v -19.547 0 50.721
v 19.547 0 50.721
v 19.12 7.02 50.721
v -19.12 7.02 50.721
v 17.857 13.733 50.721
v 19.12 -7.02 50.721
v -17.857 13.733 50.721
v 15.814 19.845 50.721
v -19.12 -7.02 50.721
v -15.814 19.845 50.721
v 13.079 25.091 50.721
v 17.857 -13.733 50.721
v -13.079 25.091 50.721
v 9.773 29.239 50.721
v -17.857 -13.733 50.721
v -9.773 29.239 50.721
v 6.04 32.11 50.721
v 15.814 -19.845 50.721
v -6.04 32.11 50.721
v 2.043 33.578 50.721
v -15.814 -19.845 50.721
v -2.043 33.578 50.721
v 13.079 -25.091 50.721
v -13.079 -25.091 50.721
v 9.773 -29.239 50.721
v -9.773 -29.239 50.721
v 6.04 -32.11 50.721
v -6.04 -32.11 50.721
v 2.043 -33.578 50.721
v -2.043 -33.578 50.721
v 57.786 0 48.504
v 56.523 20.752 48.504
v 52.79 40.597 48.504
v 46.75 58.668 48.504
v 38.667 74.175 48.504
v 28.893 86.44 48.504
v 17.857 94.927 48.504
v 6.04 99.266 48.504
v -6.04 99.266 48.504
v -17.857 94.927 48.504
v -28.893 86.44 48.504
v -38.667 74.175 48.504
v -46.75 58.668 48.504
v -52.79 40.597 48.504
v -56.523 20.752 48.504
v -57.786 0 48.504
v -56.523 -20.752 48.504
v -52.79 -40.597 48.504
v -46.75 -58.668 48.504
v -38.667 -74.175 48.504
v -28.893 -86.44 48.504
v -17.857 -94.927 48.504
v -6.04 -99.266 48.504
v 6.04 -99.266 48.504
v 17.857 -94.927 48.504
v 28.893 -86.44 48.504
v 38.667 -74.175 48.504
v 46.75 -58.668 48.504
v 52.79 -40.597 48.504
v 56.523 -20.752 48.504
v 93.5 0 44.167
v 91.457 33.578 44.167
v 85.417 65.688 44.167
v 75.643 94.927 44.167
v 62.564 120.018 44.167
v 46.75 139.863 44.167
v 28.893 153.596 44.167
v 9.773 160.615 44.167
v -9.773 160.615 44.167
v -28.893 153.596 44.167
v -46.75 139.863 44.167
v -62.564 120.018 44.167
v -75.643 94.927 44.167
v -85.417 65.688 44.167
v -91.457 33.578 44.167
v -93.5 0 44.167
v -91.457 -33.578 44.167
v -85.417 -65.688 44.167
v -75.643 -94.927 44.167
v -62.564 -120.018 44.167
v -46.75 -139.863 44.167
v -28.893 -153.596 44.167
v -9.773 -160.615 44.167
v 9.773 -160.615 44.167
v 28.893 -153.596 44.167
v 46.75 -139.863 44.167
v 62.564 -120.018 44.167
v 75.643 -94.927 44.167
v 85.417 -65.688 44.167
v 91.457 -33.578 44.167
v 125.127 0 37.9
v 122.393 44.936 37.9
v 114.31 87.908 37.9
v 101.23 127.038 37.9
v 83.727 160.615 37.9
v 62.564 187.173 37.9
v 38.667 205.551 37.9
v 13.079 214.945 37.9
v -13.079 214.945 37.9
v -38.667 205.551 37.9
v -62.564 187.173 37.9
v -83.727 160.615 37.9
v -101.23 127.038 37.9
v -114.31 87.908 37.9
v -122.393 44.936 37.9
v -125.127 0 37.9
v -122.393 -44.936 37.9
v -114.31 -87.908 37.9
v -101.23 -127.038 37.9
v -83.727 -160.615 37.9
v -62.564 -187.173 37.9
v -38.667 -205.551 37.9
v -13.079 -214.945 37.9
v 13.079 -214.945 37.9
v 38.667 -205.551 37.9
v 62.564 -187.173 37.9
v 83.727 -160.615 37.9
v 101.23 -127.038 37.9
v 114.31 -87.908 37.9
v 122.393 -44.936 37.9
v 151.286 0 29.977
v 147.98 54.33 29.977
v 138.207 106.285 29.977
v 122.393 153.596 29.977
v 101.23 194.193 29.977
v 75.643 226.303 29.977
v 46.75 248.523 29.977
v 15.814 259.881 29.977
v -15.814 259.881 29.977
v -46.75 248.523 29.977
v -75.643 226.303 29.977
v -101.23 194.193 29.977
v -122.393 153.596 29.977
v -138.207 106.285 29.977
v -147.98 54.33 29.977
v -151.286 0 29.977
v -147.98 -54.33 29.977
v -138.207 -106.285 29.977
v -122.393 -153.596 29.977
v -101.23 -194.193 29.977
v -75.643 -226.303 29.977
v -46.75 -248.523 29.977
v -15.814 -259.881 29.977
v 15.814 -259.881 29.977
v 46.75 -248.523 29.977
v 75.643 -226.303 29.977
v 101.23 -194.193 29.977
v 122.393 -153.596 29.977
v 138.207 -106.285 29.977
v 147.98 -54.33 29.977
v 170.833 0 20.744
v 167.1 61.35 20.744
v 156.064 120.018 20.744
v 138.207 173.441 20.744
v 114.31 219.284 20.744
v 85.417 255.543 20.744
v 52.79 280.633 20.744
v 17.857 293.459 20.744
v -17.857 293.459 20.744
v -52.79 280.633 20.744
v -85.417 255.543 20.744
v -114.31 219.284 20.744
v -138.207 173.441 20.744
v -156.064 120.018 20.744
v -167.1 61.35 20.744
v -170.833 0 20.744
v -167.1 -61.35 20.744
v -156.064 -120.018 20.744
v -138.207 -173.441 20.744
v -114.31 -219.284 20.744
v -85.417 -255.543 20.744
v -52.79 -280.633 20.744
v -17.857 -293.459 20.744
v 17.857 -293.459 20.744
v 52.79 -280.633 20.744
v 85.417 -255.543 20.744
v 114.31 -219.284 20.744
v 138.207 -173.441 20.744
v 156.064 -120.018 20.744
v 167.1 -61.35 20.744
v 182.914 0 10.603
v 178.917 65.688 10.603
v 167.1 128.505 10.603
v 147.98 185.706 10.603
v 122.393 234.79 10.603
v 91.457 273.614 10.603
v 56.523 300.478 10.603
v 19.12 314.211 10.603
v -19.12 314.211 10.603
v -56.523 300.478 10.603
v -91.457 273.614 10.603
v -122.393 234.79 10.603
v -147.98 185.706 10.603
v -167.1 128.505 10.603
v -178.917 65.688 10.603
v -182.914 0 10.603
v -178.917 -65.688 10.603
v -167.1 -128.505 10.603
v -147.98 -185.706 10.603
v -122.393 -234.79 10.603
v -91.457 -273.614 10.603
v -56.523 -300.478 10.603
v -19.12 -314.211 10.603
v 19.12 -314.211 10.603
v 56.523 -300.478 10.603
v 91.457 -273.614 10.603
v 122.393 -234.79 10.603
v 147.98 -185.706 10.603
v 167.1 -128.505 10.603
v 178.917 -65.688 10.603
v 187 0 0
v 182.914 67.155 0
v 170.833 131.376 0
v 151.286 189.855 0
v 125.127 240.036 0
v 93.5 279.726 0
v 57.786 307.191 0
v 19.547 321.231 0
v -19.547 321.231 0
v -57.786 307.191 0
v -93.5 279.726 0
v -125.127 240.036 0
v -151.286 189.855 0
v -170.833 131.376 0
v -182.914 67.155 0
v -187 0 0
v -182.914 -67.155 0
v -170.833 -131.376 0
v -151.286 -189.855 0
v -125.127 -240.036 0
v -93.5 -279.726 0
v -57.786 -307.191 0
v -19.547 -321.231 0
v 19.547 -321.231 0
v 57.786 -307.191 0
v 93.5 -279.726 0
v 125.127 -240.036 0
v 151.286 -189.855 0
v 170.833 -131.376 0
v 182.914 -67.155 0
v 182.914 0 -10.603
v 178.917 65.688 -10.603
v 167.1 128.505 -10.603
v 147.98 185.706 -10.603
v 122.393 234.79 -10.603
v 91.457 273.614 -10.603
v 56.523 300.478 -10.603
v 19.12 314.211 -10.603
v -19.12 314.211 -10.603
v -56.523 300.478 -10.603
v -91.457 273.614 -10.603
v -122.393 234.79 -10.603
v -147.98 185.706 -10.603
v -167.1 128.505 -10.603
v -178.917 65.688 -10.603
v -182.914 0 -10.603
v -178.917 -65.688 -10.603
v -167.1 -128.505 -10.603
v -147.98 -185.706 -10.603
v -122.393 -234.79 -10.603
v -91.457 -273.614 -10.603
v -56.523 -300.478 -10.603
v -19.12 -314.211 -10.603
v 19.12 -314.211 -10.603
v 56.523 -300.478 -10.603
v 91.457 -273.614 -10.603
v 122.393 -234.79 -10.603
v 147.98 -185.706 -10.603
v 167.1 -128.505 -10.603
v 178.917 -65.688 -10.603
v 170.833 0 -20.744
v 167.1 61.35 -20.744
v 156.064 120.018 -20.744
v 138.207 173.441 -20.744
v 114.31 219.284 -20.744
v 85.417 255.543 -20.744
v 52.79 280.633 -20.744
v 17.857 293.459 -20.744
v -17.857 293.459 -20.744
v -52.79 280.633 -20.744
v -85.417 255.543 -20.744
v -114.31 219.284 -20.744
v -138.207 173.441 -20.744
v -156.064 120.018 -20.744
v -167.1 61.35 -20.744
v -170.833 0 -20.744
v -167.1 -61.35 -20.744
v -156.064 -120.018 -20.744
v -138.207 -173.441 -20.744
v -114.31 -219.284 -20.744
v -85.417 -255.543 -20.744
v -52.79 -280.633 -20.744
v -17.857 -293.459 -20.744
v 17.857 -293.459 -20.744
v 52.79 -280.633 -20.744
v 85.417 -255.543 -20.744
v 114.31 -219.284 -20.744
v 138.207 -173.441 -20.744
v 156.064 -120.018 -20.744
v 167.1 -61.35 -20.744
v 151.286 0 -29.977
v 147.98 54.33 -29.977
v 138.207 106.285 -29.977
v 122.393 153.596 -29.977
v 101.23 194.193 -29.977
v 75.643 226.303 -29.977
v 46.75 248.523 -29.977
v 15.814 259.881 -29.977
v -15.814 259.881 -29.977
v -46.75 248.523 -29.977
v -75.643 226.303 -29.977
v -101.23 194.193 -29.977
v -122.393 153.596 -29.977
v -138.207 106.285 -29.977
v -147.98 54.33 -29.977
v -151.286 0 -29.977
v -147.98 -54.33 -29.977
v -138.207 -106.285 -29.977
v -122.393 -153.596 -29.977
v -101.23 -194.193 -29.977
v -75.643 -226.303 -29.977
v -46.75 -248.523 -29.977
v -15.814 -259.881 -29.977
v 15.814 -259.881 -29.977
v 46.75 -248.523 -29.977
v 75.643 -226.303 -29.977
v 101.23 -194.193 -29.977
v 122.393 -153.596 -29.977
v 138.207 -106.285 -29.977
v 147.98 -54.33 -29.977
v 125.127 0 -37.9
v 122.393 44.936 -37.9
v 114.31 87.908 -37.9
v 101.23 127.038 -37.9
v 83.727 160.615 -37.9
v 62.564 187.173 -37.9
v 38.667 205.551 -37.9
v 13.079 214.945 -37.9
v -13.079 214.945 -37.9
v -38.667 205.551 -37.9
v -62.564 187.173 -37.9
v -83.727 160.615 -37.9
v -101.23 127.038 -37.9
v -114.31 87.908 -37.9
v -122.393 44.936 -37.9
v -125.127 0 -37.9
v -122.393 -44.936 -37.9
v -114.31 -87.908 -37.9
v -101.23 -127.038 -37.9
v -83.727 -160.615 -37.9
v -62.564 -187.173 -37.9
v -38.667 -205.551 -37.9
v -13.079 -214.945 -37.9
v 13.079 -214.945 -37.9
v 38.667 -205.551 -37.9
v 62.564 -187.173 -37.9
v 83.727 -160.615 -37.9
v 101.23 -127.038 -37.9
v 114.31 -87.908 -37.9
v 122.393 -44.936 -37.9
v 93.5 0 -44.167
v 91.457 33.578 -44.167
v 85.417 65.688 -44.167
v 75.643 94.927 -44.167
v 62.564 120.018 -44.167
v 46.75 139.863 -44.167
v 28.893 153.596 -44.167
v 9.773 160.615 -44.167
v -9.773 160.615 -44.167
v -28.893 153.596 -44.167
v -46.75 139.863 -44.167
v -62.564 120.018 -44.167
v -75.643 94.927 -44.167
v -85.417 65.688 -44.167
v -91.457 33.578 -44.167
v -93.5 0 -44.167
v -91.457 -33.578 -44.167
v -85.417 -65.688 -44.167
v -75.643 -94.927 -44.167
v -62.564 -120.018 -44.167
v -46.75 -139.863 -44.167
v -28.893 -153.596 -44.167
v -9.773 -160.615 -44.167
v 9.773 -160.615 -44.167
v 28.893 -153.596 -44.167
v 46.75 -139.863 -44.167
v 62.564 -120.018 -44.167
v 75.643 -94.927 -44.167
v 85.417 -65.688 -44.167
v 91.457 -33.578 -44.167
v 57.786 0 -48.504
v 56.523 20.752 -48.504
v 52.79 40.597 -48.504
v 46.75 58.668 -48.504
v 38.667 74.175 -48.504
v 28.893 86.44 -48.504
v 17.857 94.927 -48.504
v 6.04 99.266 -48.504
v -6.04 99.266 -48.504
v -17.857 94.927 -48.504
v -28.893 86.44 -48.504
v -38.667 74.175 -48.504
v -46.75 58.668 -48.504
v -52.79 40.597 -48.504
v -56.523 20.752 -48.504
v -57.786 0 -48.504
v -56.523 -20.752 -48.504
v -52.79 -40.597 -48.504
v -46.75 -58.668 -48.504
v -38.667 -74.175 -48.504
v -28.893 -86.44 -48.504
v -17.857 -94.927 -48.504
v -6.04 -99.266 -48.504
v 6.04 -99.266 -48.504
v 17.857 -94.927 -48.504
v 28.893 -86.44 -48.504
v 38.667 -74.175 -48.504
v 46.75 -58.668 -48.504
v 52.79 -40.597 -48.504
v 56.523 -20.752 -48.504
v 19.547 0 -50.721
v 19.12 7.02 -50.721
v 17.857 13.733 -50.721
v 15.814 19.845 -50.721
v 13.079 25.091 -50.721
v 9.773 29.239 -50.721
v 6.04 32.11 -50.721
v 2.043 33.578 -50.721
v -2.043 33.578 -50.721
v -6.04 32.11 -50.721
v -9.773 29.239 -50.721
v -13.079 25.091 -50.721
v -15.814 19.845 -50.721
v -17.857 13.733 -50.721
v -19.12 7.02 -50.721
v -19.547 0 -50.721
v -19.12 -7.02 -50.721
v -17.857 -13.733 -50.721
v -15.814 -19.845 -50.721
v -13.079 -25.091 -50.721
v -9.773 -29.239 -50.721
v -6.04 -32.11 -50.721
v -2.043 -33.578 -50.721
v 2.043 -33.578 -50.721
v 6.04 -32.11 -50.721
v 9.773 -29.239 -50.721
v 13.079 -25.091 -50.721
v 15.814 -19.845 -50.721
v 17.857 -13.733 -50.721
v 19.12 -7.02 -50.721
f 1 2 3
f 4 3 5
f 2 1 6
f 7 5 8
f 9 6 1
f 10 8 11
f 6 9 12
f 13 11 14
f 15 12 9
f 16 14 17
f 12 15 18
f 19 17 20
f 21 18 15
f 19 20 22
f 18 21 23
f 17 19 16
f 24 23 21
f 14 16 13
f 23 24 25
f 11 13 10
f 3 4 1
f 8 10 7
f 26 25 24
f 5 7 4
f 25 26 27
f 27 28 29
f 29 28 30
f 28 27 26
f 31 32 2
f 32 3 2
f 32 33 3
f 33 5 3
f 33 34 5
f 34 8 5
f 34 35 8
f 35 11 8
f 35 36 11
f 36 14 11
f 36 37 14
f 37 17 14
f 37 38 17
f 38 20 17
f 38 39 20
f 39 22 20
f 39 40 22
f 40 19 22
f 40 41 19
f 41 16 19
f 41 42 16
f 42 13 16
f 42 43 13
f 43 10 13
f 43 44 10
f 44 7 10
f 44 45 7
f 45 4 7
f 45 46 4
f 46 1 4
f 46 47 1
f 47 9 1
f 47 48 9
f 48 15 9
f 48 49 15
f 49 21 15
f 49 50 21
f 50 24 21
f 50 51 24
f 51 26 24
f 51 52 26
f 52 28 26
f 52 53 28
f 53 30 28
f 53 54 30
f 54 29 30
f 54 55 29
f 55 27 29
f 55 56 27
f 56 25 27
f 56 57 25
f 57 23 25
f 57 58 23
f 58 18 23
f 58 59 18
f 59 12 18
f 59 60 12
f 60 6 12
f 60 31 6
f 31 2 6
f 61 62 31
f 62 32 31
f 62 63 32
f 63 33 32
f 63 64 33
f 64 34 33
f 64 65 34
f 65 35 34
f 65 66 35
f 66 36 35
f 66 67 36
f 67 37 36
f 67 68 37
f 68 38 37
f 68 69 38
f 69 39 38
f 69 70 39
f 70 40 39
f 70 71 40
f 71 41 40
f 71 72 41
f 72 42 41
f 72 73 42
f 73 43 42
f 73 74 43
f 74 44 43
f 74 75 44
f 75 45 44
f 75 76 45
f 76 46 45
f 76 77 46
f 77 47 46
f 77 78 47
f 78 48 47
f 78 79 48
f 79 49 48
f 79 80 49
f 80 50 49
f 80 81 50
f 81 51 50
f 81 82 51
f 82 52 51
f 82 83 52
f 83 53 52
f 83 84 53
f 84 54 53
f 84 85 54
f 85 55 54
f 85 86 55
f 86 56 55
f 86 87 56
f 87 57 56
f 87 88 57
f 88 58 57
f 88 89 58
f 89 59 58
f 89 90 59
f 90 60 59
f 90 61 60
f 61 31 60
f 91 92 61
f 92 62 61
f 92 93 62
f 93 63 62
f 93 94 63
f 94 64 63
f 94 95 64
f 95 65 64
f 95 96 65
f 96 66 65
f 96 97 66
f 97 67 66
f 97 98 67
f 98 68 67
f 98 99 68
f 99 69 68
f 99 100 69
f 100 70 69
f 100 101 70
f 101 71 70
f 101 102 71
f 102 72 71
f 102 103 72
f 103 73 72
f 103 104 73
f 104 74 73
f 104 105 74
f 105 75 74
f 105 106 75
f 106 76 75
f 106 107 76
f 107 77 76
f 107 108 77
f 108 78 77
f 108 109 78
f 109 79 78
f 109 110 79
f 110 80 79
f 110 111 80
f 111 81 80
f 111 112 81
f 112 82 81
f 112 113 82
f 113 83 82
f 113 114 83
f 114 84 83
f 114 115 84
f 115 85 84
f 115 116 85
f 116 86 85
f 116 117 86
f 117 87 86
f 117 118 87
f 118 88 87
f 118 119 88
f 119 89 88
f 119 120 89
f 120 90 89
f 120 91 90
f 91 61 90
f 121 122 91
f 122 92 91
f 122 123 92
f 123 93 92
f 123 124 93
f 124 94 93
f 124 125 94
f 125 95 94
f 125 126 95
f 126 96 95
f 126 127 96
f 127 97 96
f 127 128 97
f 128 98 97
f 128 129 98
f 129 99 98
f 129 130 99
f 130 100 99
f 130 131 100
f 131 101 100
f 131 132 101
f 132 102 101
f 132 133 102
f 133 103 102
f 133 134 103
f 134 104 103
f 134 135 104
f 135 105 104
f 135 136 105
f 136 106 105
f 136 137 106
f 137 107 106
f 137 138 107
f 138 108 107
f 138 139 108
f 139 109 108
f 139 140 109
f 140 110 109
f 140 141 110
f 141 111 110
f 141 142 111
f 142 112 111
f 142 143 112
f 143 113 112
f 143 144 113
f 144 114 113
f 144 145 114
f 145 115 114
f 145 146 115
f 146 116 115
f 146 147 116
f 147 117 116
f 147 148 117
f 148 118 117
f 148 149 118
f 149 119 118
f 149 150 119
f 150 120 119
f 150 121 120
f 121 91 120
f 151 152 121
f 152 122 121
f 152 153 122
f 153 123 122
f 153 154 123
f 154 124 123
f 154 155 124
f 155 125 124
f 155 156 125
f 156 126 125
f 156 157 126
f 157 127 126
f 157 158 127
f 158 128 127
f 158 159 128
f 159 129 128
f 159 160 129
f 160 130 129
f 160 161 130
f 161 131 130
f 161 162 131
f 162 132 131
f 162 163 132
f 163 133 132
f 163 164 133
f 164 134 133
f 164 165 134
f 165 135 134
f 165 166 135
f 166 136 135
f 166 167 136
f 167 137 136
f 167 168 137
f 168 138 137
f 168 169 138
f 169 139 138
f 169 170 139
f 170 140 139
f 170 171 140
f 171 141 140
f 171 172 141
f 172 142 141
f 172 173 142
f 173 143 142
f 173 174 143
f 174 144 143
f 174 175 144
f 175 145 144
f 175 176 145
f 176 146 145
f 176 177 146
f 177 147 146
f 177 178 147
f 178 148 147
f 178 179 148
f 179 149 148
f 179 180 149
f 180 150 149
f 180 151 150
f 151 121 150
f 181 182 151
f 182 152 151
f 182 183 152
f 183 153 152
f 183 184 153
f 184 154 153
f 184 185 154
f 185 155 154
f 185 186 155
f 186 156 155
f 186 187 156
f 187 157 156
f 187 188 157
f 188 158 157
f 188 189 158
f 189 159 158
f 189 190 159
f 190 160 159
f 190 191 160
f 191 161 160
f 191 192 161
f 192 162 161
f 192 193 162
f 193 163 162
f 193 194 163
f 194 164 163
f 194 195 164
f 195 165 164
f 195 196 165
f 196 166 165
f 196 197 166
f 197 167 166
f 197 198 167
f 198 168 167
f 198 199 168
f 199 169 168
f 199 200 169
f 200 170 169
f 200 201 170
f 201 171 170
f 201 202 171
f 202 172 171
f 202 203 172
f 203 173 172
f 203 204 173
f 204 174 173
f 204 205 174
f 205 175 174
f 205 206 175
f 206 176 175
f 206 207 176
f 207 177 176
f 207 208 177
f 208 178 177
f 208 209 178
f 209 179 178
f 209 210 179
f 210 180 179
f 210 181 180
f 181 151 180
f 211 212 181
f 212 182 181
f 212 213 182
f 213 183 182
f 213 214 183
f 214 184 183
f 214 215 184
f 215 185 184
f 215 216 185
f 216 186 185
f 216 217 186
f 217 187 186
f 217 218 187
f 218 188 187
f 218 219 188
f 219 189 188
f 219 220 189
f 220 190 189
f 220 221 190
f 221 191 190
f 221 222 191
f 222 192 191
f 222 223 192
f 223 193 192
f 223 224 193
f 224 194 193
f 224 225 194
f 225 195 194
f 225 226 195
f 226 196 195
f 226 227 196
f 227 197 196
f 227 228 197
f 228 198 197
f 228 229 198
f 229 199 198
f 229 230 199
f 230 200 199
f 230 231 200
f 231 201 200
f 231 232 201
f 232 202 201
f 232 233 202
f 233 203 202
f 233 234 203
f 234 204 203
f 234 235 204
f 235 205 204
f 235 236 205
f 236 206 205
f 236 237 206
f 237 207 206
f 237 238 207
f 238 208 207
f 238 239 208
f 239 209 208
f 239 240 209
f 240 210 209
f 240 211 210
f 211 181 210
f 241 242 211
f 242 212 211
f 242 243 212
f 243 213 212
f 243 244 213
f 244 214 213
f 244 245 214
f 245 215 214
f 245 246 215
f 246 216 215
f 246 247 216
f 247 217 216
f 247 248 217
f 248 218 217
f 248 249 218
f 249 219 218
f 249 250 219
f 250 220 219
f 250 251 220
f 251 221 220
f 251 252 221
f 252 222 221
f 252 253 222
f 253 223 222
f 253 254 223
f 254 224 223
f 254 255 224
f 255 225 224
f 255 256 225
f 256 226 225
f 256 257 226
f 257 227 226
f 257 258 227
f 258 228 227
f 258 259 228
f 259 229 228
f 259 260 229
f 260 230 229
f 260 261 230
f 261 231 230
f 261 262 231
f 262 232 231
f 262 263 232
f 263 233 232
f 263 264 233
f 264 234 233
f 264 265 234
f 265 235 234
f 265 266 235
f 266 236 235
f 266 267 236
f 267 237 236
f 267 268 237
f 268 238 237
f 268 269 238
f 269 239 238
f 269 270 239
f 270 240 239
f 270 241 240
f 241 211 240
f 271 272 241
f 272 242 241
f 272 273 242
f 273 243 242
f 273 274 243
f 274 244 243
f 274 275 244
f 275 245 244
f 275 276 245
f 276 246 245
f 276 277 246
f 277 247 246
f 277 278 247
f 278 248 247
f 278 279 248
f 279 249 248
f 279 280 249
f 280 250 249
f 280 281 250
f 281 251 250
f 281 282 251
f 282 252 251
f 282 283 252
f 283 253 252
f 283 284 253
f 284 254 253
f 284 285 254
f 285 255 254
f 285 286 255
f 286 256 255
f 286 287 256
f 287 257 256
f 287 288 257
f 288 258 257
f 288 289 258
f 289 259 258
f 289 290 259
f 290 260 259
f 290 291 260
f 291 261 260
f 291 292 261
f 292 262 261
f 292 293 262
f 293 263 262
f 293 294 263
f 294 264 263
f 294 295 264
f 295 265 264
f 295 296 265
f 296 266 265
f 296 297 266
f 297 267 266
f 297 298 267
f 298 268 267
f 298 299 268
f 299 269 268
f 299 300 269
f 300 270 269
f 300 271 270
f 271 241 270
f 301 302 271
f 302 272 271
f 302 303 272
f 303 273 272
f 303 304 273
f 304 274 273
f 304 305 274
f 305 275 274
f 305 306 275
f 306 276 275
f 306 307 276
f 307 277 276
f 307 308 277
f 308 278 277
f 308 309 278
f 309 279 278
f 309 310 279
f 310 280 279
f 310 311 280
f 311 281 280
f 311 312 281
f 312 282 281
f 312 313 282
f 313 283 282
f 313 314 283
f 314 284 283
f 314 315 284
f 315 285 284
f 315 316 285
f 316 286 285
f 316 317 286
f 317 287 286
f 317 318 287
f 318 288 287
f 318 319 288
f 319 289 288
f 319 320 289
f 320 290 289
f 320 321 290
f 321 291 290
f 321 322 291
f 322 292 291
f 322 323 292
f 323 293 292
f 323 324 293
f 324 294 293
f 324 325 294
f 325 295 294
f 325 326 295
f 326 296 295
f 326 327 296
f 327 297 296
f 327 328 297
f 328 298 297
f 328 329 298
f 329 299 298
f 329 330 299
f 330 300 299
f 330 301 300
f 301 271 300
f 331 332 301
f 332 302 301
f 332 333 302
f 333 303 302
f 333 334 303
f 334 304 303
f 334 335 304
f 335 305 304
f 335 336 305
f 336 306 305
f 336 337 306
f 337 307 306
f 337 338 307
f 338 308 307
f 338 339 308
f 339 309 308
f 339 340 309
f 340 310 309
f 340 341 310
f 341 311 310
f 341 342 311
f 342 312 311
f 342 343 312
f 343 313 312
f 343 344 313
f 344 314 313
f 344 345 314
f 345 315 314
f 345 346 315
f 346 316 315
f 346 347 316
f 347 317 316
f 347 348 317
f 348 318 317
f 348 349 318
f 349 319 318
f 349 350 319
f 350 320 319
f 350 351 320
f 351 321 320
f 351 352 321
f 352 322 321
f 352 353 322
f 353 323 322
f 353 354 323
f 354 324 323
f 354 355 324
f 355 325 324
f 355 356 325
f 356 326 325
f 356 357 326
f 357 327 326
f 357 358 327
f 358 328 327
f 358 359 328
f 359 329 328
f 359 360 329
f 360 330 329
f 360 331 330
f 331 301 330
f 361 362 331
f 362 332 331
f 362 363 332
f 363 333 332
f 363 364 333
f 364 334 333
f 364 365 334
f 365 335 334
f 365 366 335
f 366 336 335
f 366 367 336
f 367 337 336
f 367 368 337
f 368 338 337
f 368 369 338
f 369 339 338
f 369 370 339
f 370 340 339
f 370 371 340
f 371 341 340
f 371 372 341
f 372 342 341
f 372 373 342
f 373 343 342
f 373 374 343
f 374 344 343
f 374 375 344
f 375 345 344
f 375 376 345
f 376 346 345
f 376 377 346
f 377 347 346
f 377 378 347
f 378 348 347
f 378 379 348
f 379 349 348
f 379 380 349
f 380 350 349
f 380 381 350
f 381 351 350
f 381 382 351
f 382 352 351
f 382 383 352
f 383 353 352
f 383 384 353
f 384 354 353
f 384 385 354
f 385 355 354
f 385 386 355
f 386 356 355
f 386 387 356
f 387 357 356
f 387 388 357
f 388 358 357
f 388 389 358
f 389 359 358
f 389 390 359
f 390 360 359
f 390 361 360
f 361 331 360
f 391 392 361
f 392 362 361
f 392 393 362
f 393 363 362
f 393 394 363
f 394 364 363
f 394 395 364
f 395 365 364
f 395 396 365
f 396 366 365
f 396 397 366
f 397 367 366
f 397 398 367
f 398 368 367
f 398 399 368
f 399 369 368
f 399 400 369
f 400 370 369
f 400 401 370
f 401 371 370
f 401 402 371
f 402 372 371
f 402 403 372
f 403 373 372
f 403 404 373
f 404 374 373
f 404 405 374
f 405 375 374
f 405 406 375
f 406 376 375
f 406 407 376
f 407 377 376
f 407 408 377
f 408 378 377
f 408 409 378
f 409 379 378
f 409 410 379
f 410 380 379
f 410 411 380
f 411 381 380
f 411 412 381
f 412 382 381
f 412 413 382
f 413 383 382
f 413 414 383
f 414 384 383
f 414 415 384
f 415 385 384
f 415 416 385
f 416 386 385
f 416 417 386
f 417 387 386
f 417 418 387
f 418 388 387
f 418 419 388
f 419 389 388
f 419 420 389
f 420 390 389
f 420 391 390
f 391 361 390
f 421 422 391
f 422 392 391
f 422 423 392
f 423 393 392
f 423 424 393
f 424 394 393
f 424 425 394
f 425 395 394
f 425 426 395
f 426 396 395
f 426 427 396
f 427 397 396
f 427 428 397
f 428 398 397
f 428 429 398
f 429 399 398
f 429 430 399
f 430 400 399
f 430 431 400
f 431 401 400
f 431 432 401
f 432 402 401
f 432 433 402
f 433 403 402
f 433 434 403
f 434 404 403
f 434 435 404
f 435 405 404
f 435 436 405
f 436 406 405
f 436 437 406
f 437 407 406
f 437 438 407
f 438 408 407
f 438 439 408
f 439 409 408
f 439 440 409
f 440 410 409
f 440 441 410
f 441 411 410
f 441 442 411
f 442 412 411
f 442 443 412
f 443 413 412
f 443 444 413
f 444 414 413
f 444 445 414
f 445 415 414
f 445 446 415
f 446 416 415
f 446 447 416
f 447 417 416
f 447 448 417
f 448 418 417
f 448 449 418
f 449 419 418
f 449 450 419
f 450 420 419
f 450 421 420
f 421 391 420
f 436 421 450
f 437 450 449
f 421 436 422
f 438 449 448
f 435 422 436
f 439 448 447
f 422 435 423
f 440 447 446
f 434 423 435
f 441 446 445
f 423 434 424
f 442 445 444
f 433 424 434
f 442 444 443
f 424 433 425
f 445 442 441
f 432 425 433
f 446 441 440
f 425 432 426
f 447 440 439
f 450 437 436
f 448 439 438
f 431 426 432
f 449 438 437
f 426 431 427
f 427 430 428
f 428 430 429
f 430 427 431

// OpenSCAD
// Generated by SolidPython 1.0.1 on 2020-07-29 00:46:50


scale(v = [11, 19, 3]) {
	sphere(r = 17);
}
/***********************************************
*********      SolidPython code:      **********
************************************************
 
# import packages: SolidPython
from solid import *
from solid.utils import *
from itertools import chain, combinations, permutations


class Resize:

    def __init__(self, scad_file):
        self.scad_file = scad_file
        #self.scad_file = import_scad(scad_file)
        # cone/cylinder param:
        self.r1 = 0
        self.r2 = 0
        self.h = 0
        # rectangular prism param:
        self.w = 0
        self.l = 0
        # ellipse param:
        self.r = 0

    # import OpenScad code (file name corresponds to shape)


    # classify shape + parameters
    def assign(self, param1, param2, param3):
        if self.scad_file == 'cone.scad':
            self.r1 = param1
            self.r2 = param2
            self.h = param3
        elif self.scad_file == 'cylinder.scad':
            self.r1 = param1
            self.r2 = param2
            self.h = param3
        elif self.scad_file == 'rectangularPrism.scad':
            self.h = param1
            self.l = param2
            self.w = param3
        else:
            self.r = param1
            self.h = param2

    # resize parameters
    def iterate(self):
        x = range(3, 20, 2)
        i = 1
        if self.scad_file == 'cone.scad':
            tempList = list(permutations(x, 2))
            for temp in tempList:
                param1 = temp[0]
                param2 = temp[1]
                filepath = 'produced_scad_files/' + 'cone' + str(param1) + '_' + str(param2) + '_' + '.scad'
                scad_render_to_file(cylinder(h=param1, r1=param2, r2=0), filepath)

        elif self.scad_file == 'cylinder.scad':
            tempList = list(permutations(x, 3))
            for temp in tempList:
                param1 = temp[0]
                param2 = temp[1]
                filepath = 'produced_scad_files/' + 'cylinder' + str(param1) + '_' + str(param2) + '_' + '.scad'
                scad_render_to_file(cylinder(h=param1, r1=param2, r2=param2), filepath)

        elif self.scad_file == 'rectangularPrism.scad':
            tempList = list(permutations(x, 3))
            for temp in tempList:
                param1 = temp[0]
                param2 = temp[1]
                param3 = temp[2]
                filepath = 'produced_scad_files/' + 'rectangularPrism' + str(param1) + '_' + str(param2) + '_' + str(
                    param3) + '.scad'
                scad_render_to_file(cube(size=(param1, param2, param3)), filepath)

        elif self.scad_file == 'ellipse.scad':
            tempList = list(permutations(x, 4))
            for temp in tempList:
                param1 = temp[0]
                param2 = temp[1]
                param3 = temp[2]
                param4 = temp[3]
                filepath = 'produced_scad_files/' + 'ellipse' + str(param1) + '_' + str(param2) + '_' + str(param3) + '_' + str(param4) + '.scad'
                scad_render_to_file(scale([param1, param2, param3])(sphere(r=param4)), filepath)

    def render_to_scadfile(self):
        scad_render_to_file(scad, 'example.scad') 
 
************************************************/
